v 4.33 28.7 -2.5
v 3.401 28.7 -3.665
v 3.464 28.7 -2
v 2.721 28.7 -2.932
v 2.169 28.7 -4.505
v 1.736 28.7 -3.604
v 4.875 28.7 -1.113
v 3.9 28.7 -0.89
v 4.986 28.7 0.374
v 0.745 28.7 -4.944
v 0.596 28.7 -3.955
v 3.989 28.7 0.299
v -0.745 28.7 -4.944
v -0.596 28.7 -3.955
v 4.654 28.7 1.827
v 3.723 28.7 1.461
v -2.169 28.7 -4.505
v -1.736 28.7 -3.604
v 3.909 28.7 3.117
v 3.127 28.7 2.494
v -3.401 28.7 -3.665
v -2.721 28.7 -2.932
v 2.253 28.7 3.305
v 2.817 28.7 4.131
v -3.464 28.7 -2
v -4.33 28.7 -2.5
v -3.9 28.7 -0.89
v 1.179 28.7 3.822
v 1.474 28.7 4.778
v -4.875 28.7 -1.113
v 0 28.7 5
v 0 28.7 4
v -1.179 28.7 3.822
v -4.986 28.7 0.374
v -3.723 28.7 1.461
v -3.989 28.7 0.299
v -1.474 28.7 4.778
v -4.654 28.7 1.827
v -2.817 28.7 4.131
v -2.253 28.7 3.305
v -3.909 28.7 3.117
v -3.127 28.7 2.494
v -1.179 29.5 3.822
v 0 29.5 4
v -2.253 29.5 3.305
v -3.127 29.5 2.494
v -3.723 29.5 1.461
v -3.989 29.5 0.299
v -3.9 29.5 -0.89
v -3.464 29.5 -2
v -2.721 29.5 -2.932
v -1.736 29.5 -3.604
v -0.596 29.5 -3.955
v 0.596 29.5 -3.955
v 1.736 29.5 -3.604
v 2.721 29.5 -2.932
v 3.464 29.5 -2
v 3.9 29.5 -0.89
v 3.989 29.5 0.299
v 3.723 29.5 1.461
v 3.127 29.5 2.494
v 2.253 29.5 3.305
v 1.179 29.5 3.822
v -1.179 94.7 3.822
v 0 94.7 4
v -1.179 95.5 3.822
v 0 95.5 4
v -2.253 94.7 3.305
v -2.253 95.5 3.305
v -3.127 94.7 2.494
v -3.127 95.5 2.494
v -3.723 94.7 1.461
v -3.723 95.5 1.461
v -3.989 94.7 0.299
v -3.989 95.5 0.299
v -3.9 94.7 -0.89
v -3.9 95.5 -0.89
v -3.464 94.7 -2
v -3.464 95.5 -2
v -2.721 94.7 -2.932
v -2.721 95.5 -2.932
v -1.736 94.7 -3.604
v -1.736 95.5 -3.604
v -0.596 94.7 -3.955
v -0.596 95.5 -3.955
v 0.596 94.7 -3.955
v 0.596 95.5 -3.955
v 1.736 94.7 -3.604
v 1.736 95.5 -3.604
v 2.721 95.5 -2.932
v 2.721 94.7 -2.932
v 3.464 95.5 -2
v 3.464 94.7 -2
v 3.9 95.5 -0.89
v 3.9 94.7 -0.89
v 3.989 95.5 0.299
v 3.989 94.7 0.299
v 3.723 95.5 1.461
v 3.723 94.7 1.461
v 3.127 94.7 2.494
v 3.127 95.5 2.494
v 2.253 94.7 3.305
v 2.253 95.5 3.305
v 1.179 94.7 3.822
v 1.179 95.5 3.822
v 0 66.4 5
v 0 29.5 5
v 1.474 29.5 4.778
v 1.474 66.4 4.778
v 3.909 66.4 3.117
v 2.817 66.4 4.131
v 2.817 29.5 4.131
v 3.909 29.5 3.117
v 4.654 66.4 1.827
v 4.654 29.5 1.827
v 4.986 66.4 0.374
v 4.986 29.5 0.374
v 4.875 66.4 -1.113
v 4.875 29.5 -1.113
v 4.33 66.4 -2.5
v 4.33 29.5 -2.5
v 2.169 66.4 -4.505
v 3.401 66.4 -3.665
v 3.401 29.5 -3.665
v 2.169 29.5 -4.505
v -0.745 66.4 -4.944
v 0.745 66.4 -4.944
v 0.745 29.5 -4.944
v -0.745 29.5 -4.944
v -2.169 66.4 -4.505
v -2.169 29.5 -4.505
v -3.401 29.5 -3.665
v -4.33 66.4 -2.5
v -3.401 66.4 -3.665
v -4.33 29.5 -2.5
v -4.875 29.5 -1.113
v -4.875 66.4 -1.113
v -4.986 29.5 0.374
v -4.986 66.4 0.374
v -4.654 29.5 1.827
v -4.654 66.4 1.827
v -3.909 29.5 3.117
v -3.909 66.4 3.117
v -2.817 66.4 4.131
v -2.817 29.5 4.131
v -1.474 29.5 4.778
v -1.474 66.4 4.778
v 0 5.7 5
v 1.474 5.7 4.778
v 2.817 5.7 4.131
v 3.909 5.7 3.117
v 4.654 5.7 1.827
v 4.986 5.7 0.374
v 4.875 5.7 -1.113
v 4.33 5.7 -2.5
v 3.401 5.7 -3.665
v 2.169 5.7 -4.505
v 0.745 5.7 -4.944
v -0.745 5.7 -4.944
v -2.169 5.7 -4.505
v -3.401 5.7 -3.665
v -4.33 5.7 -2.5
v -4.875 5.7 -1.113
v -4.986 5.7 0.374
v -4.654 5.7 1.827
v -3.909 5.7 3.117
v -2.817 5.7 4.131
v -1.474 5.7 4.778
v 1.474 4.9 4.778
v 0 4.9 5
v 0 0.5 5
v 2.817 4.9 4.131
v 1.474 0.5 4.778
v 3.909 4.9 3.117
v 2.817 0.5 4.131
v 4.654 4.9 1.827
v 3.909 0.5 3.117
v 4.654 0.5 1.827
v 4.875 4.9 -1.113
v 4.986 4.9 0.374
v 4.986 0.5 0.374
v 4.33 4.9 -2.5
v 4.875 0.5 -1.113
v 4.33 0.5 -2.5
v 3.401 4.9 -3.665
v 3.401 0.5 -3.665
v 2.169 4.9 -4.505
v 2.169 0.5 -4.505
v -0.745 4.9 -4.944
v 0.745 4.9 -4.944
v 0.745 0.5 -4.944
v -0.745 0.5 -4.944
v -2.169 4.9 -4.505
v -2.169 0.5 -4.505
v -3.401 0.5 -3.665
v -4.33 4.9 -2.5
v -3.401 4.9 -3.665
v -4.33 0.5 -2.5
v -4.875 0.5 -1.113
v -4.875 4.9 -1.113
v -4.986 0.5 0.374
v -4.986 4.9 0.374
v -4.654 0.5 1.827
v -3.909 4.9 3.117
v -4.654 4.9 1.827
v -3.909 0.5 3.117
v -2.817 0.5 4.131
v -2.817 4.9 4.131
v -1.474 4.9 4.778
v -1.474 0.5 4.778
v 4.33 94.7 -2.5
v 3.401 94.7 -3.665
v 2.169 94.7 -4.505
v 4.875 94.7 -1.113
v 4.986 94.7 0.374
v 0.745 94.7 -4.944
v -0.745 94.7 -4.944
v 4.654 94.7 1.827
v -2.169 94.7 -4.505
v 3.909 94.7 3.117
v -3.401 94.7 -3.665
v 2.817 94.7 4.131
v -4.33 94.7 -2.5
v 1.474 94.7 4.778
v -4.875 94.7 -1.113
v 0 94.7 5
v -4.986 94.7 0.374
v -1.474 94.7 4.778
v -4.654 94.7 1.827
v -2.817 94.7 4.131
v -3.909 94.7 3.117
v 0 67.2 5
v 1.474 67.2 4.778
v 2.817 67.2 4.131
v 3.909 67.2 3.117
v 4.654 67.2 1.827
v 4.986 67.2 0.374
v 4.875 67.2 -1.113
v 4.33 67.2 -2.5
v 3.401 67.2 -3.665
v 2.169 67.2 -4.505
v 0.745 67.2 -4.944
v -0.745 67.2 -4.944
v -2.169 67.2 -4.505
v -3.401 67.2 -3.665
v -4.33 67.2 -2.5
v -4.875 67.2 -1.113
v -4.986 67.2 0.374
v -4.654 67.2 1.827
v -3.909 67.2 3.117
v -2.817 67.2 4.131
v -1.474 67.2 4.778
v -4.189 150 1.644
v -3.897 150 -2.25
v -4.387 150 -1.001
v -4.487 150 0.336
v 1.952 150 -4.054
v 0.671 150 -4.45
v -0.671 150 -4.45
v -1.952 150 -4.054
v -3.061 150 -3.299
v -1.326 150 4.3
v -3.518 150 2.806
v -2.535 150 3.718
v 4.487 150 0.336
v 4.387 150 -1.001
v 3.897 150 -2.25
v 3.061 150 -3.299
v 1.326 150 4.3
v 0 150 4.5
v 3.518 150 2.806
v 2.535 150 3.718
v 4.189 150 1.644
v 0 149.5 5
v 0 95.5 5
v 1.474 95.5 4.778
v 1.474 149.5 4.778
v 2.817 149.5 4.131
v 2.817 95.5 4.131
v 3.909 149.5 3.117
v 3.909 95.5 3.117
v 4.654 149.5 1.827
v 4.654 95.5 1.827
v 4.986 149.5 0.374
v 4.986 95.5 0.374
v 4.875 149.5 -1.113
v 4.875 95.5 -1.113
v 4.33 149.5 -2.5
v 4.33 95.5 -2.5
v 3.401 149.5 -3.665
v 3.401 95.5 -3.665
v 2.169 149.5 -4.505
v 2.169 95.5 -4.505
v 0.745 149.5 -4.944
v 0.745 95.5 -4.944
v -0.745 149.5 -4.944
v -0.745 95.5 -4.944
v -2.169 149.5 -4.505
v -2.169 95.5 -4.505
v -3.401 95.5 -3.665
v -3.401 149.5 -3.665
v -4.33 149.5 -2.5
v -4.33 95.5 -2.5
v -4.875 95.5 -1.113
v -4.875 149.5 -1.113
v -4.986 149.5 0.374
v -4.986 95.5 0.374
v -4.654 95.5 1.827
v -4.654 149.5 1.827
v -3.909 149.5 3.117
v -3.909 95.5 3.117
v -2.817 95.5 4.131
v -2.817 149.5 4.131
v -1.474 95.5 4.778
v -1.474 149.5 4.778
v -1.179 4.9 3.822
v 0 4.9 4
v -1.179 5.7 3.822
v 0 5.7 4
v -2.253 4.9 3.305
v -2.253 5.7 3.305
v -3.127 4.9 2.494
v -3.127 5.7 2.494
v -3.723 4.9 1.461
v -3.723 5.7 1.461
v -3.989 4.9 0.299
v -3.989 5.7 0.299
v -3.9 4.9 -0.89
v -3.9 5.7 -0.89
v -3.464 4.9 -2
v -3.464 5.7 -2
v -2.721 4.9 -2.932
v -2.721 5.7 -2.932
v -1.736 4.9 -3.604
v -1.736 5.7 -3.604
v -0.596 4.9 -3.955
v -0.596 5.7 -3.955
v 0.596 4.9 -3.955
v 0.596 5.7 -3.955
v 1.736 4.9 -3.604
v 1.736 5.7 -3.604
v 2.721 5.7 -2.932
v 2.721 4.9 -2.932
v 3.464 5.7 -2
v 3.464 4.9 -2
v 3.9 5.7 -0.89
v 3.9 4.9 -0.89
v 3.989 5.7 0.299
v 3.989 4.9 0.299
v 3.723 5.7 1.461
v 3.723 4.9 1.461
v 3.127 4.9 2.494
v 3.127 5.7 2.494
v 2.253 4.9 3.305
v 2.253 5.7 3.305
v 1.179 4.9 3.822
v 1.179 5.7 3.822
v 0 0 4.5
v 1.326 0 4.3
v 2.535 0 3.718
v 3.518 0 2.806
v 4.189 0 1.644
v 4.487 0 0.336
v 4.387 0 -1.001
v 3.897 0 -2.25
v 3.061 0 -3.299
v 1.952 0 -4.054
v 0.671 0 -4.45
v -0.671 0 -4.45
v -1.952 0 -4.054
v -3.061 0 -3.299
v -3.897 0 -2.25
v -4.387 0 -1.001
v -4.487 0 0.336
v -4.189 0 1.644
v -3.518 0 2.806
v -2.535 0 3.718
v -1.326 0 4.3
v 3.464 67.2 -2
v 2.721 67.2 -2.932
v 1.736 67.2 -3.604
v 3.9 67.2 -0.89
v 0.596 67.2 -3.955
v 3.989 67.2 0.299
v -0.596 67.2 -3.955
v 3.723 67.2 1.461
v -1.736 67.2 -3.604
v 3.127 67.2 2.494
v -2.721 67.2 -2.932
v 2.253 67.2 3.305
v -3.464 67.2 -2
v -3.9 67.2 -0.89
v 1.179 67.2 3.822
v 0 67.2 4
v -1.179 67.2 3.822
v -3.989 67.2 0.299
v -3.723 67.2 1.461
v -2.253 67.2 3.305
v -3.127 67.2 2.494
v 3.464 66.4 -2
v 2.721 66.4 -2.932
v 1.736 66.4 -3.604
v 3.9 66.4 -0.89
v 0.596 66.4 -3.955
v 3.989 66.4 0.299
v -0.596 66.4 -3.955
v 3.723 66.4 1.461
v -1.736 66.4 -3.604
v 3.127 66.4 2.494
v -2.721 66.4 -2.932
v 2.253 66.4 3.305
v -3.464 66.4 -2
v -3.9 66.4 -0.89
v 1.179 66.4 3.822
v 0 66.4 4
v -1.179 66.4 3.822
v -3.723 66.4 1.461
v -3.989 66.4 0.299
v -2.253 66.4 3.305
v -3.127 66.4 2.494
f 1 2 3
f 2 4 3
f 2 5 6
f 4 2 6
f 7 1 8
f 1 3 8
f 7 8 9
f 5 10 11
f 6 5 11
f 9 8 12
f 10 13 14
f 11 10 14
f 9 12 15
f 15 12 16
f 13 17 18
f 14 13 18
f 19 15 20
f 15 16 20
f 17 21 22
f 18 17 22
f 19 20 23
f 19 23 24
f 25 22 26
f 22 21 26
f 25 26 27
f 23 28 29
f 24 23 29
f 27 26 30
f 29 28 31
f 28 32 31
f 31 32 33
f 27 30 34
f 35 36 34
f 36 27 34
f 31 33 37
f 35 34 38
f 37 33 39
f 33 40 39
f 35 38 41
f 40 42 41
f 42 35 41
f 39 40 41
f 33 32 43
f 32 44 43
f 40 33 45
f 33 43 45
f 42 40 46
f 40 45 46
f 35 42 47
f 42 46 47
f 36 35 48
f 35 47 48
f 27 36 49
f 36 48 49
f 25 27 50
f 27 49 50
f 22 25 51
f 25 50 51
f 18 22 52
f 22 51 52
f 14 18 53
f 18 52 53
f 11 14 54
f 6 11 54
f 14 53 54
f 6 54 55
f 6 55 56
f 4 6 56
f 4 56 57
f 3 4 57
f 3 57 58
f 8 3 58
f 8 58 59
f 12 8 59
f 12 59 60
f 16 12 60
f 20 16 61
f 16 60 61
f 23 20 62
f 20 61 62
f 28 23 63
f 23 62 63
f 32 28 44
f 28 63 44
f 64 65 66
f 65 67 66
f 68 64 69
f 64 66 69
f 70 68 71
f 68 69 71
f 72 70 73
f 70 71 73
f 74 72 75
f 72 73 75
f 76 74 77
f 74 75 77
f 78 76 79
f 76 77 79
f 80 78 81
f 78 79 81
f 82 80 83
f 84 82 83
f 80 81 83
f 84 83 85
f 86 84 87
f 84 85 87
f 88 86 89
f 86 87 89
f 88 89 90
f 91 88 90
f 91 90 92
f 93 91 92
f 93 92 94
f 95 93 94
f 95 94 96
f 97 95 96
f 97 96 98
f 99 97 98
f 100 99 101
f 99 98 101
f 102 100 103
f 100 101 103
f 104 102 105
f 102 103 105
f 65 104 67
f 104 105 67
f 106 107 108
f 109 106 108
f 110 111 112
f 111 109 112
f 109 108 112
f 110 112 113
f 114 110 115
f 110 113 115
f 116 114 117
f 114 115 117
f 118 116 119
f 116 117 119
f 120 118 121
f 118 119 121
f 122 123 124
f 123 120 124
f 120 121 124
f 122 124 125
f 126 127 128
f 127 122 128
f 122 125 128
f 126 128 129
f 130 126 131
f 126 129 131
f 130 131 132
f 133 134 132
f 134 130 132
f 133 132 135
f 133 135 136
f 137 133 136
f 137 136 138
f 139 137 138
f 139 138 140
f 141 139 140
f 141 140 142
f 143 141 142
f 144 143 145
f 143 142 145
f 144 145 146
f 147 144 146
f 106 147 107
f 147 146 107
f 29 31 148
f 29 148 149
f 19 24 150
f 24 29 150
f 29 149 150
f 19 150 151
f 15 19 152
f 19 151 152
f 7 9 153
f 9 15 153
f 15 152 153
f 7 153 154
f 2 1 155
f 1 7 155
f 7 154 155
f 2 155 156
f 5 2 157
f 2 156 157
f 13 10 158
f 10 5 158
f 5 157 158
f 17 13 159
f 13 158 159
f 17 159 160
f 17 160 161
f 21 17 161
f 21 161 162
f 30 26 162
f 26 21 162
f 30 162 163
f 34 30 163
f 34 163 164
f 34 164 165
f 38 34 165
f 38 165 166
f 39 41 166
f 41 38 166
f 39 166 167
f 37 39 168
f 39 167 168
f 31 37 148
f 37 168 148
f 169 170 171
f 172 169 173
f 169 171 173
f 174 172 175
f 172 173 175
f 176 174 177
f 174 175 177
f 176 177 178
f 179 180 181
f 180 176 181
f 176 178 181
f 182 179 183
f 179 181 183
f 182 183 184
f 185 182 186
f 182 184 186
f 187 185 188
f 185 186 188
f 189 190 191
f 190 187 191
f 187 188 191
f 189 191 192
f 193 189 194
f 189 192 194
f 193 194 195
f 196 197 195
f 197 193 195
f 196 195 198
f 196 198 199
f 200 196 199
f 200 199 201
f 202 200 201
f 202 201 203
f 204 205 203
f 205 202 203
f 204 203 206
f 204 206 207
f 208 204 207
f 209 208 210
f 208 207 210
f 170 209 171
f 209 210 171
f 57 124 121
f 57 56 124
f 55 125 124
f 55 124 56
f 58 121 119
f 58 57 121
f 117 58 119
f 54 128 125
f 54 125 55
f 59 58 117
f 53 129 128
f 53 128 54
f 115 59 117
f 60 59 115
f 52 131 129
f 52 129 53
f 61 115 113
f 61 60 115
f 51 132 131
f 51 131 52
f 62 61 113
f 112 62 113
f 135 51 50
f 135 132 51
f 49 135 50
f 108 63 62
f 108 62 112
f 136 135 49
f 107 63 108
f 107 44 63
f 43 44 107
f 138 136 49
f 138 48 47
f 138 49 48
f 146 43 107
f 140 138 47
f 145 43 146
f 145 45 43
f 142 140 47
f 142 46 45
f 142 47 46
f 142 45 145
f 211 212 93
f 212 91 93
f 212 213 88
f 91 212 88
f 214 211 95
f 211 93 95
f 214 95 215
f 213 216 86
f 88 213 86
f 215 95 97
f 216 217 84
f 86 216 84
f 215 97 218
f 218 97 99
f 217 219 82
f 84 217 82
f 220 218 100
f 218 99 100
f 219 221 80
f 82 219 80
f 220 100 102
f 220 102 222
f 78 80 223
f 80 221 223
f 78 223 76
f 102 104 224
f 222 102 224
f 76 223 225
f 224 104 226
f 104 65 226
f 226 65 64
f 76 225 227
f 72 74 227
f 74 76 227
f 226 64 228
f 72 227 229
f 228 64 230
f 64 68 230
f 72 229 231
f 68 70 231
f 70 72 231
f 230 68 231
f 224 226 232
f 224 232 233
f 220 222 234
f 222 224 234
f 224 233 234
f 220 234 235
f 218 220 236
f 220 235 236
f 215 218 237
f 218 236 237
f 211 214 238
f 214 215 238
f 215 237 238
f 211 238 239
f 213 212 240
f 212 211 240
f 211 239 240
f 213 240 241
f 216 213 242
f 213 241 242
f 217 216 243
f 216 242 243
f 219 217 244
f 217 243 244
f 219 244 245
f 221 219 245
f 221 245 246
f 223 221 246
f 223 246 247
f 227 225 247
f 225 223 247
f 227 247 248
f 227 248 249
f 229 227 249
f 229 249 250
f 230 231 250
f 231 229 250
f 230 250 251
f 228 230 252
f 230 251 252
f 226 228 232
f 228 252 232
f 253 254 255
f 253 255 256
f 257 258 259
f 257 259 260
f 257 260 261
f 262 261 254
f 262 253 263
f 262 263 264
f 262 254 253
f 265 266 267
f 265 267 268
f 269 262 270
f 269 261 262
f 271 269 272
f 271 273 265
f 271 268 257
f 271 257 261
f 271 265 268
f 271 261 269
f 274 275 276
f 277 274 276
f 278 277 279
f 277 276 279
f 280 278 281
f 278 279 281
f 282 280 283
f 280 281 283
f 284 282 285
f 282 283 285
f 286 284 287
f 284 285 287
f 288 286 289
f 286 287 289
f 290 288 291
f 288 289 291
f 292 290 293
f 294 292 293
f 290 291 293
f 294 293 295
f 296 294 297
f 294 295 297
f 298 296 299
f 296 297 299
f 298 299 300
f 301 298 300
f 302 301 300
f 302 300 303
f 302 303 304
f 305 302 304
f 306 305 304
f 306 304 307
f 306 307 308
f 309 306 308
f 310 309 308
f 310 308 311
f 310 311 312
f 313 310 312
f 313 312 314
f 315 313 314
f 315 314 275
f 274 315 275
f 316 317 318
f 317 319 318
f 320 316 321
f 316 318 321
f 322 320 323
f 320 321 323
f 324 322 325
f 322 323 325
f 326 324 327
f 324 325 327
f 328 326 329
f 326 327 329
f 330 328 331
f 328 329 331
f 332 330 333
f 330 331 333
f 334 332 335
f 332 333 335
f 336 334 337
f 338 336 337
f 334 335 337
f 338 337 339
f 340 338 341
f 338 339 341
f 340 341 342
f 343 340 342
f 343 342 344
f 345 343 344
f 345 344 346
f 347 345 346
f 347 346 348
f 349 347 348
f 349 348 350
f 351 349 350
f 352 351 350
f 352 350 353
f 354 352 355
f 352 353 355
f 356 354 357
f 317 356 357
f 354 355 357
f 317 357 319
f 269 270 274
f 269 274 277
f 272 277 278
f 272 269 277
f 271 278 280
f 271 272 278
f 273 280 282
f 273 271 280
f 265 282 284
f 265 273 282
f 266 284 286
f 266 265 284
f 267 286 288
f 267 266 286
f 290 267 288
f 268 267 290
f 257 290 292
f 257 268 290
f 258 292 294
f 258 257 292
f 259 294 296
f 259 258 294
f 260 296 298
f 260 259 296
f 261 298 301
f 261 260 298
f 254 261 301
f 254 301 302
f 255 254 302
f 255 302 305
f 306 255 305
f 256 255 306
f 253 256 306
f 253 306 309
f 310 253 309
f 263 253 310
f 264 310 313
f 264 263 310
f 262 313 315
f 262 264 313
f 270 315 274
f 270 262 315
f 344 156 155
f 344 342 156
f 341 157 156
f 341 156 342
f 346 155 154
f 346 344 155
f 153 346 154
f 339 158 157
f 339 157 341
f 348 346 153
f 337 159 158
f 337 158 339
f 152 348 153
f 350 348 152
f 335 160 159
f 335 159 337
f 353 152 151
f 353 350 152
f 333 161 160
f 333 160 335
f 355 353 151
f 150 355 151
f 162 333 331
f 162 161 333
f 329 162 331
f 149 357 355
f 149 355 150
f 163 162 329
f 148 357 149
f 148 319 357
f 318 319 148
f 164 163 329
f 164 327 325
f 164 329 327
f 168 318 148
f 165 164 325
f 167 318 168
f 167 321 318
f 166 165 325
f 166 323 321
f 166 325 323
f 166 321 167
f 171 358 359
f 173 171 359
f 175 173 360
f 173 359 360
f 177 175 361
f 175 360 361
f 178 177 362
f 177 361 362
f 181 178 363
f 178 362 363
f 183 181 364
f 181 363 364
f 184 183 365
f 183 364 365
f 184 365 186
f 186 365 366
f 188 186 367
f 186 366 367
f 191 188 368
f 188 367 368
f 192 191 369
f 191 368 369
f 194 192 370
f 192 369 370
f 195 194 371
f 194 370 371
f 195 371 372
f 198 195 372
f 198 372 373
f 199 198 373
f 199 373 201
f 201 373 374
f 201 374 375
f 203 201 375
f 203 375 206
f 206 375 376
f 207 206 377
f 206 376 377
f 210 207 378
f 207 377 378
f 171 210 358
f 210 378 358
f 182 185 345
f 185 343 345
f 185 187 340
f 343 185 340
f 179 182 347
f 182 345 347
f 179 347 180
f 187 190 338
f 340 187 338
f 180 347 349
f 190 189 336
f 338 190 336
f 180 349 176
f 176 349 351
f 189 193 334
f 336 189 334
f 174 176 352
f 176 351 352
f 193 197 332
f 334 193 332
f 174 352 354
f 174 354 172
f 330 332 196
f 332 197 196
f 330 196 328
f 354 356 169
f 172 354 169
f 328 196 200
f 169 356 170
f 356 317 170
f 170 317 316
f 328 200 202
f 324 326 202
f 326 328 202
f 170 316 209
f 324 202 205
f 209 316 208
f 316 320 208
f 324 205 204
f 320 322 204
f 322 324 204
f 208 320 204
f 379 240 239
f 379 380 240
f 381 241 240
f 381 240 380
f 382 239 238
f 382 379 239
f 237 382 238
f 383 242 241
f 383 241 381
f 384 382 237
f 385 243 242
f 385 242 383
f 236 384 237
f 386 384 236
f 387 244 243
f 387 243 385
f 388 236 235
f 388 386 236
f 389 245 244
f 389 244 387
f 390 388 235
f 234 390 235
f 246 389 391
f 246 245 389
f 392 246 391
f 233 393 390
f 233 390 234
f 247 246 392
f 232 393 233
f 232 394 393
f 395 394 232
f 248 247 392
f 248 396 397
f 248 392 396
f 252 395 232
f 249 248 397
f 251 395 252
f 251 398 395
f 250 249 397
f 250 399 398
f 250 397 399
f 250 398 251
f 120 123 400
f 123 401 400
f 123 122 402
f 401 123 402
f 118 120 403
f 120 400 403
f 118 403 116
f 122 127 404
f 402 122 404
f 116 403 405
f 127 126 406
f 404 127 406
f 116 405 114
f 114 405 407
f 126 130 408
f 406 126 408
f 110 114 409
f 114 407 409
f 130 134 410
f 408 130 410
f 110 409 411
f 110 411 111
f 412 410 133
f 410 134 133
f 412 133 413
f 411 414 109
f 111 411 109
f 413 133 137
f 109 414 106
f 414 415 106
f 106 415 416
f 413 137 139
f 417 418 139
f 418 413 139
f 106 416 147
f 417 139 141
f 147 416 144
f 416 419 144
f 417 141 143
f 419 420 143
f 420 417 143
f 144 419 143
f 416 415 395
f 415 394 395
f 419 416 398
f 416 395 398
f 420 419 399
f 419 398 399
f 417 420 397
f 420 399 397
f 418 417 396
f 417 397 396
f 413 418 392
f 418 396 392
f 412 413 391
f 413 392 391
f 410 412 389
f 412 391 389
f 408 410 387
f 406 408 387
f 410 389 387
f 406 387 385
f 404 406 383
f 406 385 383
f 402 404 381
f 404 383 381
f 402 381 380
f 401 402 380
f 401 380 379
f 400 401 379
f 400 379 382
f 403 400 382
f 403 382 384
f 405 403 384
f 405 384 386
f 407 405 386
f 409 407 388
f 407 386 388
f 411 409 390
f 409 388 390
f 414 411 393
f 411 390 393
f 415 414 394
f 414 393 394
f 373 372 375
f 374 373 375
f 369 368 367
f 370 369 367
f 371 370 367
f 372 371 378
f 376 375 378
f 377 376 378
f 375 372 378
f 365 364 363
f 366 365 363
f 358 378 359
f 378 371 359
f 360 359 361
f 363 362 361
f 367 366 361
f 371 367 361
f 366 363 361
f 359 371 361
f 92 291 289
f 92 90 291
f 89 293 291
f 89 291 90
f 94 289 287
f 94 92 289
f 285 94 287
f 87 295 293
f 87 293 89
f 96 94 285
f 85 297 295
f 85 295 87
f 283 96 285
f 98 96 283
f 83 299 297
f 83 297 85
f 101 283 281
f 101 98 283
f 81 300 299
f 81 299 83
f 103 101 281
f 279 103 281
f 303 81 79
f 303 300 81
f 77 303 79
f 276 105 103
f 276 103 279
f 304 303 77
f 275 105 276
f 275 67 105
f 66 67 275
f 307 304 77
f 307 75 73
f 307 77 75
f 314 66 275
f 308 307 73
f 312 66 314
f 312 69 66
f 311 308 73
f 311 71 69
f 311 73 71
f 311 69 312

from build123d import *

# Parameters (mm, degrees)
SKETCH1_R           = 5
BOSS_EXTRUDE1_DEPTH = 150
CHAMFER1_SIZE       = 0.5
SKETCH2_W           = 1
SKETCH2_H           = 0.8
LPATTERN1_COUNT     = 2
LPATTERN1_PITCH     = 28.3
SKETCH3_W           = 1
SKETCH3_H           = 0.8


with BuildPart() as part:
    # Sketch1 → Boss-Extrude1 (new body)
    with BuildSketch(Plane(origin=(0, 0, 0), x_dir=(1, 0, 0), z_dir=(0, 1, 0))):
        with Locations(Location((0, 0, 0), (0, 0, 270))):
            Circle(SKETCH1_R)
    extrude(amount=BOSS_EXTRUDE1_DEPTH)

    # Chamfer1
    chamfer1_edges = [part.edges().sort_by_distance(p)[0] for p in [
        (0, 0, -5),
        (0, 150, -5),
    ]]
    chamfer(chamfer1_edges, length=CHAMFER1_SIZE)

    # Sketch2 → Cut-Revolve1 (revolve, cut)
    with BuildSketch(Plane.XY, mode=Mode.PRIVATE) as cut_revolve1_sk:
        with Locations((-4.5, 66.8)):
            Rectangle(SKETCH2_W, SKETCH2_H)
    cut_revolve1 = revolve(cut_revolve1_sk.sketch.rotate(Axis((0, 141.907824912, 0), (0, -1, 0)), 270), axis=Axis((0, 141.907824912, 0), (0, -1, 0)), mode=Mode.SUBTRACT)

    # LPattern1: Cut-Revolve1 ×2
    with Locations(*[(0, i * LPATTERN1_PITCH, 0) for i in range(1, LPATTERN1_COUNT)]):
        add(cut_revolve1, mode=Mode.SUBTRACT)

    # Sketch3 → Cut-Revolve2 (revolve, cut)
    with BuildSketch(Plane.XY, mode=Mode.PRIVATE) as cut_revolve2_sk:
        with Locations((-4.5, 5.3)):
            Rectangle(SKETCH3_W, SKETCH3_H)
        with Locations((-4.5, 29.1)):
            Rectangle(SKETCH3_W, SKETCH3_H)
    revolve(cut_revolve2_sk.sketch.rotate(Axis((0, 152.904561978, 0), (0, -1, 0)), 270), axis=Axis((0, 152.904561978, 0), (0, -1, 0)), mode=Mode.SUBTRACT)


solid = part.part
